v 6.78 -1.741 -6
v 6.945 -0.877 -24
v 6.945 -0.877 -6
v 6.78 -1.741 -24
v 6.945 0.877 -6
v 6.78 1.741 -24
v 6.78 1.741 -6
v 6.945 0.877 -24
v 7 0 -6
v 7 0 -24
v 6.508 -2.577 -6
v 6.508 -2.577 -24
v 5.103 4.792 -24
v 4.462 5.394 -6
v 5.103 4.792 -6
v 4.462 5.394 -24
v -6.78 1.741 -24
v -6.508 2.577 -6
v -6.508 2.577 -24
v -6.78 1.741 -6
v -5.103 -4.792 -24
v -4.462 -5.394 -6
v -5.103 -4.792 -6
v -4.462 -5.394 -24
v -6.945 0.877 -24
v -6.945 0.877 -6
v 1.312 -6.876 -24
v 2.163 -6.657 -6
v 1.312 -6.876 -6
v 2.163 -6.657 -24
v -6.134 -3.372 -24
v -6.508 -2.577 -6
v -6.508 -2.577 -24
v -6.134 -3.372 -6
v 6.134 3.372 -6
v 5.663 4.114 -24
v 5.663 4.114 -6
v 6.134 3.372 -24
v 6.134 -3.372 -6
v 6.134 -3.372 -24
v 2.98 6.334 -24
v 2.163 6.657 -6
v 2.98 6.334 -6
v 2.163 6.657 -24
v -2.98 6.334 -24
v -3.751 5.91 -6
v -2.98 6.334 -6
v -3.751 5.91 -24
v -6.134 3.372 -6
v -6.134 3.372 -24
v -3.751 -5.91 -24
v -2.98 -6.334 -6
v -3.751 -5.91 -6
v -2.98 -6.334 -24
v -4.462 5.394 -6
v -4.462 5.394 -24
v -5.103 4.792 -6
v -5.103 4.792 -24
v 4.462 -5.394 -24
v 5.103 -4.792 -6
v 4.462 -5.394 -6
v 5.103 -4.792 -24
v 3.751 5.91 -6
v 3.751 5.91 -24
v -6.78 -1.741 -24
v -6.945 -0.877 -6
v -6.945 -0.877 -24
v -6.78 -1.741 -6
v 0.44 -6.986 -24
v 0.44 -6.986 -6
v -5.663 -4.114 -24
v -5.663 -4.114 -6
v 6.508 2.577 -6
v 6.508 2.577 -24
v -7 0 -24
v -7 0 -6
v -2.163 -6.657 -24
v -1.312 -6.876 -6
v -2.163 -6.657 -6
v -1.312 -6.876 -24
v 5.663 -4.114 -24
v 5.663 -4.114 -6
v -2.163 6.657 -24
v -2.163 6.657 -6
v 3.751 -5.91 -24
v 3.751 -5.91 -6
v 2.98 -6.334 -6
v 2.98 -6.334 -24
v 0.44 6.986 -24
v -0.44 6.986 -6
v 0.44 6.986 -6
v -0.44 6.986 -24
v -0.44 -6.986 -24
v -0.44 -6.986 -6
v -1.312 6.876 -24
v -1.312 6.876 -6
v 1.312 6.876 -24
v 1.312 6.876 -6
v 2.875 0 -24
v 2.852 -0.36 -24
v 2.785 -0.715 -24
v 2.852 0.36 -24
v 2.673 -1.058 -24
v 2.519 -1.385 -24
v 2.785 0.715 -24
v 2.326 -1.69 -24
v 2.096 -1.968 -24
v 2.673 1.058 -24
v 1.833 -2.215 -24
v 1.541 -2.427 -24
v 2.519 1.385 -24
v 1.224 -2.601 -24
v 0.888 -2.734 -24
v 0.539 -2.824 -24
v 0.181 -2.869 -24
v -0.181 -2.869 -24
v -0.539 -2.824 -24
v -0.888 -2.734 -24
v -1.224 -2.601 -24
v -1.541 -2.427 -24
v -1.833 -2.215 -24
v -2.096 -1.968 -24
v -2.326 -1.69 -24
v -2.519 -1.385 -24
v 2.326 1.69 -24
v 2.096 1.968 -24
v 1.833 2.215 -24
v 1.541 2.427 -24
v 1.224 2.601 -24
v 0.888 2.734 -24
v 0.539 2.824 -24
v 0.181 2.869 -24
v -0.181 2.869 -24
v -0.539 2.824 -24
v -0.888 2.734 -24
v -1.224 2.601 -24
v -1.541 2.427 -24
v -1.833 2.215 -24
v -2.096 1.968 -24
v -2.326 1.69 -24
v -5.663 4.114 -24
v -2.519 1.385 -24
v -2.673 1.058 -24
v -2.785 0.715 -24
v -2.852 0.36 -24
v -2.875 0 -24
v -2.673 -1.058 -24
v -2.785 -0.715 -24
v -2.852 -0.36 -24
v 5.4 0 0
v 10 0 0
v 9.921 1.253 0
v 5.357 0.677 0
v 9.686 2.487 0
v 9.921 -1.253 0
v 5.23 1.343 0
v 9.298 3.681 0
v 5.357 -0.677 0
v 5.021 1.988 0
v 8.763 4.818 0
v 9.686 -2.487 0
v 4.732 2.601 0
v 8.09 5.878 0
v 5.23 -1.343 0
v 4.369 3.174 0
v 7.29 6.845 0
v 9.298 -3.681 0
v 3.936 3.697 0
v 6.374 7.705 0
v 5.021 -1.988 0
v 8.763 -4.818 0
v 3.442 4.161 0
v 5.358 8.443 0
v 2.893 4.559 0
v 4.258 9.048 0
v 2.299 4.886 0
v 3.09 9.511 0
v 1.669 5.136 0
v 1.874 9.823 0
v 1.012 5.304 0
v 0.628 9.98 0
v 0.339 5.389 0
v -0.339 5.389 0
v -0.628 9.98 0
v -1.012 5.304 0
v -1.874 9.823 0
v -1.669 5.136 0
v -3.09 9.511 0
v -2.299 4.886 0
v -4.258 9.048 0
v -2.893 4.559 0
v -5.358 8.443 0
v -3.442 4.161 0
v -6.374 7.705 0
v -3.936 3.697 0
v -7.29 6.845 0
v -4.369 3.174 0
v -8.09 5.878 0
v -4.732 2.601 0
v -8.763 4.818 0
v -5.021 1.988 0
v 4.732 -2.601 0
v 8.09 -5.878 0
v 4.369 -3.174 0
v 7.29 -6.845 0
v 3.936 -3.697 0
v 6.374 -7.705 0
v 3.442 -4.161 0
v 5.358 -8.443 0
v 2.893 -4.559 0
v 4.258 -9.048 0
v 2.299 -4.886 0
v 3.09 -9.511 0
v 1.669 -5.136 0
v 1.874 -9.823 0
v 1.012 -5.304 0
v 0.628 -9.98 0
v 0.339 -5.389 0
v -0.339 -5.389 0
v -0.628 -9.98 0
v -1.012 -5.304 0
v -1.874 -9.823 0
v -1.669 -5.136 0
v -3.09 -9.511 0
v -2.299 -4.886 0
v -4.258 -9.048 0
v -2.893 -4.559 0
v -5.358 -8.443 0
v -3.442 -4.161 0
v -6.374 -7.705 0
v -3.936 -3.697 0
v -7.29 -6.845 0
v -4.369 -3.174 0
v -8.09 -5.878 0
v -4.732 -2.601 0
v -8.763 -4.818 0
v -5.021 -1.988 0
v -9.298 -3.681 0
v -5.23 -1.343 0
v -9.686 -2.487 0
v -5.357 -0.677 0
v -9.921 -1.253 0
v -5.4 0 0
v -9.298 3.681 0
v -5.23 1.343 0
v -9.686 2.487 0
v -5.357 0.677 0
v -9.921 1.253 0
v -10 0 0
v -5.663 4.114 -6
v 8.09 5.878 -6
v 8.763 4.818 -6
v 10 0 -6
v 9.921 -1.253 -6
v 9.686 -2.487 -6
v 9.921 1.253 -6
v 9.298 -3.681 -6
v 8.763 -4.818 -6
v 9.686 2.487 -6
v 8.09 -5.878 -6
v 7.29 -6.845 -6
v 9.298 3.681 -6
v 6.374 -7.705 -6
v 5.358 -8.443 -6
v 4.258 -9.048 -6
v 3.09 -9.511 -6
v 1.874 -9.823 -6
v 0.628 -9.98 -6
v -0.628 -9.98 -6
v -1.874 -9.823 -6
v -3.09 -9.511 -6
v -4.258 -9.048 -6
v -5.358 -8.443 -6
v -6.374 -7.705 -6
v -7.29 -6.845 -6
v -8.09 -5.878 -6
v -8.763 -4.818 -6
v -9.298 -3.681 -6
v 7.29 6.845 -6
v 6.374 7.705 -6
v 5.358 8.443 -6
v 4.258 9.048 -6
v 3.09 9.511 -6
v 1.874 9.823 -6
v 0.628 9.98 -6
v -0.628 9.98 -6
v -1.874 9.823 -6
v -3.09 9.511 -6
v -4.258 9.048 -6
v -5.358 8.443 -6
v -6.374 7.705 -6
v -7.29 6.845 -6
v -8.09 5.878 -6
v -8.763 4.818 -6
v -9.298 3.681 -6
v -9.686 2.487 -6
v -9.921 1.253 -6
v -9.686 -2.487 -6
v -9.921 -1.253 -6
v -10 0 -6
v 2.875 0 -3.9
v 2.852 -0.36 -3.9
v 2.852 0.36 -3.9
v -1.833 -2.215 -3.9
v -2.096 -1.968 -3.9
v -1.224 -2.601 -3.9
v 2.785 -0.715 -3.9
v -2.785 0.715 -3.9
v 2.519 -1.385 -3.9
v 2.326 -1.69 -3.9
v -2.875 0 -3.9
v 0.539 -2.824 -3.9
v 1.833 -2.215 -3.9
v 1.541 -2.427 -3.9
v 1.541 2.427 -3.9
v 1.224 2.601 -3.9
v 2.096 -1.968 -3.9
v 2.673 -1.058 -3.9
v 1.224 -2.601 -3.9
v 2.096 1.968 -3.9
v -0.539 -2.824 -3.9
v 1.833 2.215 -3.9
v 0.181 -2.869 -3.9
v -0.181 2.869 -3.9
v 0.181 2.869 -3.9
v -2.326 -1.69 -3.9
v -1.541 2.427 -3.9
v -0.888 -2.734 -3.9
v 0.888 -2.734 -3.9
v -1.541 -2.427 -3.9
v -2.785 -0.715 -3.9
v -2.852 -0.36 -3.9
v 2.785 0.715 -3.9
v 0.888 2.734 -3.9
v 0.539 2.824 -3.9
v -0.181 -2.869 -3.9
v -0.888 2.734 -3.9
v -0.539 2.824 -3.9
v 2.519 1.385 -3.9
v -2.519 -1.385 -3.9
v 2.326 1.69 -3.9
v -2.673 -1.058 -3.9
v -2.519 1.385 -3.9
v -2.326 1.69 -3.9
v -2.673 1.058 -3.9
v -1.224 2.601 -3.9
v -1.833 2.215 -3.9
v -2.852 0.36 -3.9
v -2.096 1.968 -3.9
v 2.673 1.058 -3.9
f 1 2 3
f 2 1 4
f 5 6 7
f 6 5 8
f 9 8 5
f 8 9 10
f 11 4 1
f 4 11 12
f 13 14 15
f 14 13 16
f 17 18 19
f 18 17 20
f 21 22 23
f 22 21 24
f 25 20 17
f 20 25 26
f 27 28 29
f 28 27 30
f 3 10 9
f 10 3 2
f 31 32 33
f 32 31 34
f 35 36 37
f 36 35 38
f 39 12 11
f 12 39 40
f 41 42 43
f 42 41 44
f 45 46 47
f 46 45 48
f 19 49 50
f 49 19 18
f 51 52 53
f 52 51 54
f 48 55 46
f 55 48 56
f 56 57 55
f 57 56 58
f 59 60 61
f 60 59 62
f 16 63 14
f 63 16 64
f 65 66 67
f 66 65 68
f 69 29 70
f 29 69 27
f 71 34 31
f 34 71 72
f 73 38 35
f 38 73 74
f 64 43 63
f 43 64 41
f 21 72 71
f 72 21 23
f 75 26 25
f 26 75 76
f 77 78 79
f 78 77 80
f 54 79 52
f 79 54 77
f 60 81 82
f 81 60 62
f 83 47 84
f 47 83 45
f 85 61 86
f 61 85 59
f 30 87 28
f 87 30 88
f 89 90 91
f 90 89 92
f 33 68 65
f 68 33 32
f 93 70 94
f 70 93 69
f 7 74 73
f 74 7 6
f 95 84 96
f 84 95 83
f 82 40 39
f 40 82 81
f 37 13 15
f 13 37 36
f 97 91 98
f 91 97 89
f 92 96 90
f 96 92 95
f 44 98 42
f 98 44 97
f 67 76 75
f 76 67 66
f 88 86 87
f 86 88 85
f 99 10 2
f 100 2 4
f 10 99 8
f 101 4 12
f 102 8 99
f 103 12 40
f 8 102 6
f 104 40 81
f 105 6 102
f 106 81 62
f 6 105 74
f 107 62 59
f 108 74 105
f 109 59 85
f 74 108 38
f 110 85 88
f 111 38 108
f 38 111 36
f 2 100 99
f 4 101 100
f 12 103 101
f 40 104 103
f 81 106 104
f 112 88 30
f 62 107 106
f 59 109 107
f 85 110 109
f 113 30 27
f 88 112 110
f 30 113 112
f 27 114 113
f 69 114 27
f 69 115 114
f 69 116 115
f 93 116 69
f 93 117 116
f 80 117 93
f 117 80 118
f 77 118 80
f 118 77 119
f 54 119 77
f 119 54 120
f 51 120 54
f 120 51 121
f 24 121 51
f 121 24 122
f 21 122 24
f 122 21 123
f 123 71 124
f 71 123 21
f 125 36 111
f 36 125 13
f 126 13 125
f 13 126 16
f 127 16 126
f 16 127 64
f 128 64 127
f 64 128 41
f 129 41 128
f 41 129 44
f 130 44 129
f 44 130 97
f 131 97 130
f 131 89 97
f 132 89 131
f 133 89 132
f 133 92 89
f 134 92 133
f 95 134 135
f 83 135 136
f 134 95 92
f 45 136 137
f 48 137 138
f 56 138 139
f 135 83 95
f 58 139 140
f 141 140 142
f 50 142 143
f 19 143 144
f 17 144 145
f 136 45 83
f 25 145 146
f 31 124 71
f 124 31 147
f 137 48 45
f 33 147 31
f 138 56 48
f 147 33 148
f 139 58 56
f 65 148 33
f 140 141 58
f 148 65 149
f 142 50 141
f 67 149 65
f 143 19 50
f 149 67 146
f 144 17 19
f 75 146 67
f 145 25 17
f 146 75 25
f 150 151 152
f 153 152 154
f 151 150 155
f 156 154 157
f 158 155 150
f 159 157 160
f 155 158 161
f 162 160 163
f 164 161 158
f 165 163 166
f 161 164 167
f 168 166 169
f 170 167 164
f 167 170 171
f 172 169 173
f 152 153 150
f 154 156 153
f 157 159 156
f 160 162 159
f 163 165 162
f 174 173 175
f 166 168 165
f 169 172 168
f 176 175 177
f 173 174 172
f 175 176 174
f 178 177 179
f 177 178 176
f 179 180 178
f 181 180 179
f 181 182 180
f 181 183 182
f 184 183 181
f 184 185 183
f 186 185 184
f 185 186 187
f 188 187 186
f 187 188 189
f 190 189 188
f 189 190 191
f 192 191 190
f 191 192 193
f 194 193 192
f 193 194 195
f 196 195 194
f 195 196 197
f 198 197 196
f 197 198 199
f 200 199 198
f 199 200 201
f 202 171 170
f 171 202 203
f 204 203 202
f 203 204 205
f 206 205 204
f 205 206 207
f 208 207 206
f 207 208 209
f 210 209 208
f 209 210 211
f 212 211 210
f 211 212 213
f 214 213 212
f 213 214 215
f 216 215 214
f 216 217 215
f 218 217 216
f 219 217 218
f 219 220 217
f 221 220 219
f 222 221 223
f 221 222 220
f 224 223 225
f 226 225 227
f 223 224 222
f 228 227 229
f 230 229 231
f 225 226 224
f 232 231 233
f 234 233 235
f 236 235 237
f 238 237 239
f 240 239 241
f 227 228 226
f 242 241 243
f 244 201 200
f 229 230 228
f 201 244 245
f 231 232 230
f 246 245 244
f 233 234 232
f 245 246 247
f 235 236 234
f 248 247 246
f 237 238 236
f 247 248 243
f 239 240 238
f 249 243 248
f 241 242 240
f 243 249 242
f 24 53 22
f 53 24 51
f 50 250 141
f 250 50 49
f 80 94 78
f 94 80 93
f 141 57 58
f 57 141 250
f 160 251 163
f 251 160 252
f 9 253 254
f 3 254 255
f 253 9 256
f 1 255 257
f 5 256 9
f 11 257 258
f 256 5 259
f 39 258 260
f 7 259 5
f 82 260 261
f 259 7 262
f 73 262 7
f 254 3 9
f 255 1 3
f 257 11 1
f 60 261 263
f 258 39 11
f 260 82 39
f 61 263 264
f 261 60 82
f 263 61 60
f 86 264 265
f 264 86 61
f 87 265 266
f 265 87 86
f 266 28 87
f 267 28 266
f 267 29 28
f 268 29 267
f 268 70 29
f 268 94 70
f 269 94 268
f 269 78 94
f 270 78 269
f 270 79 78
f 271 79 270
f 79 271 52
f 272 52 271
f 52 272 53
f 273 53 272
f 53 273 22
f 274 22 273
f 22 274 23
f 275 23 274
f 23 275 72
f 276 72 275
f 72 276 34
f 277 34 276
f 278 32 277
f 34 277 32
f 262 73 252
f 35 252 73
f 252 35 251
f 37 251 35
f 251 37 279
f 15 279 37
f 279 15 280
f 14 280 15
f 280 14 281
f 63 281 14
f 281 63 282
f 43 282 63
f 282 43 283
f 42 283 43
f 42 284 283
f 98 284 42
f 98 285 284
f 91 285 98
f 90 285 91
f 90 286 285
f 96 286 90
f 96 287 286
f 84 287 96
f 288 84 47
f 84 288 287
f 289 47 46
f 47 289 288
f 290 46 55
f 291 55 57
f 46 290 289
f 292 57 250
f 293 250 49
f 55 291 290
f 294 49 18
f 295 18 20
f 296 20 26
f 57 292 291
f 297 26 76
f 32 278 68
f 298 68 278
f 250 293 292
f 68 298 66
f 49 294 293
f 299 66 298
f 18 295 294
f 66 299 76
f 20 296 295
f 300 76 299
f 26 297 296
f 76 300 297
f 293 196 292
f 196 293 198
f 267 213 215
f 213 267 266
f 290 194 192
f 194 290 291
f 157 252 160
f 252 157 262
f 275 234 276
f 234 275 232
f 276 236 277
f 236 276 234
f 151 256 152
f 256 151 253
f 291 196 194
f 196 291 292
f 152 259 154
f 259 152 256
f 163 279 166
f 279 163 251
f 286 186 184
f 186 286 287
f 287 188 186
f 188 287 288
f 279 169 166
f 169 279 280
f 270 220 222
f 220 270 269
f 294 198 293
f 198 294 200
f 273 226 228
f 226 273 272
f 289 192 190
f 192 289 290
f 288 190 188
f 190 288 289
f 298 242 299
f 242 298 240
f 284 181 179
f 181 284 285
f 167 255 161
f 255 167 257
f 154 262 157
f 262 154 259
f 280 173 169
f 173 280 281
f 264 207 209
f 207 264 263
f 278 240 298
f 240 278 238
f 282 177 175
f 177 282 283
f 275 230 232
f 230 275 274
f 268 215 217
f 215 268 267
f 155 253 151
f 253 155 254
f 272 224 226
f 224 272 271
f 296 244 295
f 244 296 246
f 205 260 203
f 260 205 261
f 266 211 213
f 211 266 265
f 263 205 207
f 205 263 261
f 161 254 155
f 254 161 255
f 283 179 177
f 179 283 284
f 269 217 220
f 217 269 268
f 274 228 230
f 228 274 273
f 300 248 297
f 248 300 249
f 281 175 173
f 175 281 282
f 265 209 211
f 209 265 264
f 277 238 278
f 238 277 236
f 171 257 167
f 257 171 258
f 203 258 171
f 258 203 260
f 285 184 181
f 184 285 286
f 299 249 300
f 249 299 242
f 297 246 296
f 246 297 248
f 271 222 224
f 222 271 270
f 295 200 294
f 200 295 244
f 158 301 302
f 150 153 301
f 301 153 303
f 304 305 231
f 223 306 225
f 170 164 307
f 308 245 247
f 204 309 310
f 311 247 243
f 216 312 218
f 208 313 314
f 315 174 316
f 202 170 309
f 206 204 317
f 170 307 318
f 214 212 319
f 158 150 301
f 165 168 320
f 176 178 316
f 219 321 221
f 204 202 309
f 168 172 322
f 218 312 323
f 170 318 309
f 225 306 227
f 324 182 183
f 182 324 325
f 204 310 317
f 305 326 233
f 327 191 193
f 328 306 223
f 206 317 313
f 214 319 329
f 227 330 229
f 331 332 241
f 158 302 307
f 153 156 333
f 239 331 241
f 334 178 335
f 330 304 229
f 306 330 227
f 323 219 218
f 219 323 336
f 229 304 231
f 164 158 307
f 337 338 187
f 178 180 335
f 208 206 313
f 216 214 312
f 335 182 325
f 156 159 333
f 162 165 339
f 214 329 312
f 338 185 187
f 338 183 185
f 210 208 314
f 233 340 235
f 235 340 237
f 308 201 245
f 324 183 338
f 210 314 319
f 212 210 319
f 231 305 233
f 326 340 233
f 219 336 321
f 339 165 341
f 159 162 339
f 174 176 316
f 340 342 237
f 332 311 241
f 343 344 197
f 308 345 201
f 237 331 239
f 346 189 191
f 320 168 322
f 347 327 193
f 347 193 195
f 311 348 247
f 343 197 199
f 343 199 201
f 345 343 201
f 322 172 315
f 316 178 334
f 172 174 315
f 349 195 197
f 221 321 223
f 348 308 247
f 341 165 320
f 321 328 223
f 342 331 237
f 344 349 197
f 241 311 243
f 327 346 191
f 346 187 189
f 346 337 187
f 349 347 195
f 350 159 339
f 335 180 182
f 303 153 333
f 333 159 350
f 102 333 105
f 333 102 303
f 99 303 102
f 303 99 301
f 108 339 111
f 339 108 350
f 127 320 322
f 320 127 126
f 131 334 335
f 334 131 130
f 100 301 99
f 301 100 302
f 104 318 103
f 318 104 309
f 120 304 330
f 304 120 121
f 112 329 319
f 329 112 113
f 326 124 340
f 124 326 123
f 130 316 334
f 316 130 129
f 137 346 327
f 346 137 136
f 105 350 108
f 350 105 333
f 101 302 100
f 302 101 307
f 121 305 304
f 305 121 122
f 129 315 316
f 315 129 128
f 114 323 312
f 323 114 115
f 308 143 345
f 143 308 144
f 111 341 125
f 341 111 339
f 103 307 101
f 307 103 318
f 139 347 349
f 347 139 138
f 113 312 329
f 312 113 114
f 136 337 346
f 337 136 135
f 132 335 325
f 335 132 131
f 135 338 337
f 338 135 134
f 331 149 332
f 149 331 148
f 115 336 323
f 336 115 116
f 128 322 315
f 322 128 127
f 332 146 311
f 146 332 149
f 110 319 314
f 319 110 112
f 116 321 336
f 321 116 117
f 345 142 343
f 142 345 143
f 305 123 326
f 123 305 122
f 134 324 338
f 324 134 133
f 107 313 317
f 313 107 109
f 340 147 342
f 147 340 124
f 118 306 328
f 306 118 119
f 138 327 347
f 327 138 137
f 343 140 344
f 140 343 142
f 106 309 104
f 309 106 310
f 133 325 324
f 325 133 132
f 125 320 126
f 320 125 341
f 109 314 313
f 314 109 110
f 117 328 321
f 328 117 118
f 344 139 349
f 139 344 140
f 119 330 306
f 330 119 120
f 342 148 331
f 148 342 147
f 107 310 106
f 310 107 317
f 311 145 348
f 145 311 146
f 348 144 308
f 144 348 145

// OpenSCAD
$fn = 50;


difference() {
	union() {
		translate(v = [0, 0, -24.0000000000]) {
			cylinder(h = 24, r = 7.0000000000);
		}
		translate(v = [0, 0, -6.0000000000]) {
			cylinder(h = 6, r = 10.0000000000);
		}
	}
	union() {
		translate(v = [0, 0, 0]) {
			rotate(a = [0, 0, 0]) {
				difference() {
					union() {
						#translate(v = [0, 0, -24.0000000000]) {
							cylinder(h = 24, r = 2.6000000000);
						}
						#translate(v = [0, 0, -3.9000000000]) {
							cylinder(h = 3.9000000000, r1 = 2.8750000000, r2 = 5.4000000000);
						}
						#translate(v = [0, 0, -24.0000000000]) {
							cylinder(h = 24, r = 2.8750000000);
						}
						#translate(v = [0, 0, -24.0000000000]) {
							cylinder(h = 24, r = 2.6000000000);
						}
					}
					union();
				}
			}
		}
	}
}
